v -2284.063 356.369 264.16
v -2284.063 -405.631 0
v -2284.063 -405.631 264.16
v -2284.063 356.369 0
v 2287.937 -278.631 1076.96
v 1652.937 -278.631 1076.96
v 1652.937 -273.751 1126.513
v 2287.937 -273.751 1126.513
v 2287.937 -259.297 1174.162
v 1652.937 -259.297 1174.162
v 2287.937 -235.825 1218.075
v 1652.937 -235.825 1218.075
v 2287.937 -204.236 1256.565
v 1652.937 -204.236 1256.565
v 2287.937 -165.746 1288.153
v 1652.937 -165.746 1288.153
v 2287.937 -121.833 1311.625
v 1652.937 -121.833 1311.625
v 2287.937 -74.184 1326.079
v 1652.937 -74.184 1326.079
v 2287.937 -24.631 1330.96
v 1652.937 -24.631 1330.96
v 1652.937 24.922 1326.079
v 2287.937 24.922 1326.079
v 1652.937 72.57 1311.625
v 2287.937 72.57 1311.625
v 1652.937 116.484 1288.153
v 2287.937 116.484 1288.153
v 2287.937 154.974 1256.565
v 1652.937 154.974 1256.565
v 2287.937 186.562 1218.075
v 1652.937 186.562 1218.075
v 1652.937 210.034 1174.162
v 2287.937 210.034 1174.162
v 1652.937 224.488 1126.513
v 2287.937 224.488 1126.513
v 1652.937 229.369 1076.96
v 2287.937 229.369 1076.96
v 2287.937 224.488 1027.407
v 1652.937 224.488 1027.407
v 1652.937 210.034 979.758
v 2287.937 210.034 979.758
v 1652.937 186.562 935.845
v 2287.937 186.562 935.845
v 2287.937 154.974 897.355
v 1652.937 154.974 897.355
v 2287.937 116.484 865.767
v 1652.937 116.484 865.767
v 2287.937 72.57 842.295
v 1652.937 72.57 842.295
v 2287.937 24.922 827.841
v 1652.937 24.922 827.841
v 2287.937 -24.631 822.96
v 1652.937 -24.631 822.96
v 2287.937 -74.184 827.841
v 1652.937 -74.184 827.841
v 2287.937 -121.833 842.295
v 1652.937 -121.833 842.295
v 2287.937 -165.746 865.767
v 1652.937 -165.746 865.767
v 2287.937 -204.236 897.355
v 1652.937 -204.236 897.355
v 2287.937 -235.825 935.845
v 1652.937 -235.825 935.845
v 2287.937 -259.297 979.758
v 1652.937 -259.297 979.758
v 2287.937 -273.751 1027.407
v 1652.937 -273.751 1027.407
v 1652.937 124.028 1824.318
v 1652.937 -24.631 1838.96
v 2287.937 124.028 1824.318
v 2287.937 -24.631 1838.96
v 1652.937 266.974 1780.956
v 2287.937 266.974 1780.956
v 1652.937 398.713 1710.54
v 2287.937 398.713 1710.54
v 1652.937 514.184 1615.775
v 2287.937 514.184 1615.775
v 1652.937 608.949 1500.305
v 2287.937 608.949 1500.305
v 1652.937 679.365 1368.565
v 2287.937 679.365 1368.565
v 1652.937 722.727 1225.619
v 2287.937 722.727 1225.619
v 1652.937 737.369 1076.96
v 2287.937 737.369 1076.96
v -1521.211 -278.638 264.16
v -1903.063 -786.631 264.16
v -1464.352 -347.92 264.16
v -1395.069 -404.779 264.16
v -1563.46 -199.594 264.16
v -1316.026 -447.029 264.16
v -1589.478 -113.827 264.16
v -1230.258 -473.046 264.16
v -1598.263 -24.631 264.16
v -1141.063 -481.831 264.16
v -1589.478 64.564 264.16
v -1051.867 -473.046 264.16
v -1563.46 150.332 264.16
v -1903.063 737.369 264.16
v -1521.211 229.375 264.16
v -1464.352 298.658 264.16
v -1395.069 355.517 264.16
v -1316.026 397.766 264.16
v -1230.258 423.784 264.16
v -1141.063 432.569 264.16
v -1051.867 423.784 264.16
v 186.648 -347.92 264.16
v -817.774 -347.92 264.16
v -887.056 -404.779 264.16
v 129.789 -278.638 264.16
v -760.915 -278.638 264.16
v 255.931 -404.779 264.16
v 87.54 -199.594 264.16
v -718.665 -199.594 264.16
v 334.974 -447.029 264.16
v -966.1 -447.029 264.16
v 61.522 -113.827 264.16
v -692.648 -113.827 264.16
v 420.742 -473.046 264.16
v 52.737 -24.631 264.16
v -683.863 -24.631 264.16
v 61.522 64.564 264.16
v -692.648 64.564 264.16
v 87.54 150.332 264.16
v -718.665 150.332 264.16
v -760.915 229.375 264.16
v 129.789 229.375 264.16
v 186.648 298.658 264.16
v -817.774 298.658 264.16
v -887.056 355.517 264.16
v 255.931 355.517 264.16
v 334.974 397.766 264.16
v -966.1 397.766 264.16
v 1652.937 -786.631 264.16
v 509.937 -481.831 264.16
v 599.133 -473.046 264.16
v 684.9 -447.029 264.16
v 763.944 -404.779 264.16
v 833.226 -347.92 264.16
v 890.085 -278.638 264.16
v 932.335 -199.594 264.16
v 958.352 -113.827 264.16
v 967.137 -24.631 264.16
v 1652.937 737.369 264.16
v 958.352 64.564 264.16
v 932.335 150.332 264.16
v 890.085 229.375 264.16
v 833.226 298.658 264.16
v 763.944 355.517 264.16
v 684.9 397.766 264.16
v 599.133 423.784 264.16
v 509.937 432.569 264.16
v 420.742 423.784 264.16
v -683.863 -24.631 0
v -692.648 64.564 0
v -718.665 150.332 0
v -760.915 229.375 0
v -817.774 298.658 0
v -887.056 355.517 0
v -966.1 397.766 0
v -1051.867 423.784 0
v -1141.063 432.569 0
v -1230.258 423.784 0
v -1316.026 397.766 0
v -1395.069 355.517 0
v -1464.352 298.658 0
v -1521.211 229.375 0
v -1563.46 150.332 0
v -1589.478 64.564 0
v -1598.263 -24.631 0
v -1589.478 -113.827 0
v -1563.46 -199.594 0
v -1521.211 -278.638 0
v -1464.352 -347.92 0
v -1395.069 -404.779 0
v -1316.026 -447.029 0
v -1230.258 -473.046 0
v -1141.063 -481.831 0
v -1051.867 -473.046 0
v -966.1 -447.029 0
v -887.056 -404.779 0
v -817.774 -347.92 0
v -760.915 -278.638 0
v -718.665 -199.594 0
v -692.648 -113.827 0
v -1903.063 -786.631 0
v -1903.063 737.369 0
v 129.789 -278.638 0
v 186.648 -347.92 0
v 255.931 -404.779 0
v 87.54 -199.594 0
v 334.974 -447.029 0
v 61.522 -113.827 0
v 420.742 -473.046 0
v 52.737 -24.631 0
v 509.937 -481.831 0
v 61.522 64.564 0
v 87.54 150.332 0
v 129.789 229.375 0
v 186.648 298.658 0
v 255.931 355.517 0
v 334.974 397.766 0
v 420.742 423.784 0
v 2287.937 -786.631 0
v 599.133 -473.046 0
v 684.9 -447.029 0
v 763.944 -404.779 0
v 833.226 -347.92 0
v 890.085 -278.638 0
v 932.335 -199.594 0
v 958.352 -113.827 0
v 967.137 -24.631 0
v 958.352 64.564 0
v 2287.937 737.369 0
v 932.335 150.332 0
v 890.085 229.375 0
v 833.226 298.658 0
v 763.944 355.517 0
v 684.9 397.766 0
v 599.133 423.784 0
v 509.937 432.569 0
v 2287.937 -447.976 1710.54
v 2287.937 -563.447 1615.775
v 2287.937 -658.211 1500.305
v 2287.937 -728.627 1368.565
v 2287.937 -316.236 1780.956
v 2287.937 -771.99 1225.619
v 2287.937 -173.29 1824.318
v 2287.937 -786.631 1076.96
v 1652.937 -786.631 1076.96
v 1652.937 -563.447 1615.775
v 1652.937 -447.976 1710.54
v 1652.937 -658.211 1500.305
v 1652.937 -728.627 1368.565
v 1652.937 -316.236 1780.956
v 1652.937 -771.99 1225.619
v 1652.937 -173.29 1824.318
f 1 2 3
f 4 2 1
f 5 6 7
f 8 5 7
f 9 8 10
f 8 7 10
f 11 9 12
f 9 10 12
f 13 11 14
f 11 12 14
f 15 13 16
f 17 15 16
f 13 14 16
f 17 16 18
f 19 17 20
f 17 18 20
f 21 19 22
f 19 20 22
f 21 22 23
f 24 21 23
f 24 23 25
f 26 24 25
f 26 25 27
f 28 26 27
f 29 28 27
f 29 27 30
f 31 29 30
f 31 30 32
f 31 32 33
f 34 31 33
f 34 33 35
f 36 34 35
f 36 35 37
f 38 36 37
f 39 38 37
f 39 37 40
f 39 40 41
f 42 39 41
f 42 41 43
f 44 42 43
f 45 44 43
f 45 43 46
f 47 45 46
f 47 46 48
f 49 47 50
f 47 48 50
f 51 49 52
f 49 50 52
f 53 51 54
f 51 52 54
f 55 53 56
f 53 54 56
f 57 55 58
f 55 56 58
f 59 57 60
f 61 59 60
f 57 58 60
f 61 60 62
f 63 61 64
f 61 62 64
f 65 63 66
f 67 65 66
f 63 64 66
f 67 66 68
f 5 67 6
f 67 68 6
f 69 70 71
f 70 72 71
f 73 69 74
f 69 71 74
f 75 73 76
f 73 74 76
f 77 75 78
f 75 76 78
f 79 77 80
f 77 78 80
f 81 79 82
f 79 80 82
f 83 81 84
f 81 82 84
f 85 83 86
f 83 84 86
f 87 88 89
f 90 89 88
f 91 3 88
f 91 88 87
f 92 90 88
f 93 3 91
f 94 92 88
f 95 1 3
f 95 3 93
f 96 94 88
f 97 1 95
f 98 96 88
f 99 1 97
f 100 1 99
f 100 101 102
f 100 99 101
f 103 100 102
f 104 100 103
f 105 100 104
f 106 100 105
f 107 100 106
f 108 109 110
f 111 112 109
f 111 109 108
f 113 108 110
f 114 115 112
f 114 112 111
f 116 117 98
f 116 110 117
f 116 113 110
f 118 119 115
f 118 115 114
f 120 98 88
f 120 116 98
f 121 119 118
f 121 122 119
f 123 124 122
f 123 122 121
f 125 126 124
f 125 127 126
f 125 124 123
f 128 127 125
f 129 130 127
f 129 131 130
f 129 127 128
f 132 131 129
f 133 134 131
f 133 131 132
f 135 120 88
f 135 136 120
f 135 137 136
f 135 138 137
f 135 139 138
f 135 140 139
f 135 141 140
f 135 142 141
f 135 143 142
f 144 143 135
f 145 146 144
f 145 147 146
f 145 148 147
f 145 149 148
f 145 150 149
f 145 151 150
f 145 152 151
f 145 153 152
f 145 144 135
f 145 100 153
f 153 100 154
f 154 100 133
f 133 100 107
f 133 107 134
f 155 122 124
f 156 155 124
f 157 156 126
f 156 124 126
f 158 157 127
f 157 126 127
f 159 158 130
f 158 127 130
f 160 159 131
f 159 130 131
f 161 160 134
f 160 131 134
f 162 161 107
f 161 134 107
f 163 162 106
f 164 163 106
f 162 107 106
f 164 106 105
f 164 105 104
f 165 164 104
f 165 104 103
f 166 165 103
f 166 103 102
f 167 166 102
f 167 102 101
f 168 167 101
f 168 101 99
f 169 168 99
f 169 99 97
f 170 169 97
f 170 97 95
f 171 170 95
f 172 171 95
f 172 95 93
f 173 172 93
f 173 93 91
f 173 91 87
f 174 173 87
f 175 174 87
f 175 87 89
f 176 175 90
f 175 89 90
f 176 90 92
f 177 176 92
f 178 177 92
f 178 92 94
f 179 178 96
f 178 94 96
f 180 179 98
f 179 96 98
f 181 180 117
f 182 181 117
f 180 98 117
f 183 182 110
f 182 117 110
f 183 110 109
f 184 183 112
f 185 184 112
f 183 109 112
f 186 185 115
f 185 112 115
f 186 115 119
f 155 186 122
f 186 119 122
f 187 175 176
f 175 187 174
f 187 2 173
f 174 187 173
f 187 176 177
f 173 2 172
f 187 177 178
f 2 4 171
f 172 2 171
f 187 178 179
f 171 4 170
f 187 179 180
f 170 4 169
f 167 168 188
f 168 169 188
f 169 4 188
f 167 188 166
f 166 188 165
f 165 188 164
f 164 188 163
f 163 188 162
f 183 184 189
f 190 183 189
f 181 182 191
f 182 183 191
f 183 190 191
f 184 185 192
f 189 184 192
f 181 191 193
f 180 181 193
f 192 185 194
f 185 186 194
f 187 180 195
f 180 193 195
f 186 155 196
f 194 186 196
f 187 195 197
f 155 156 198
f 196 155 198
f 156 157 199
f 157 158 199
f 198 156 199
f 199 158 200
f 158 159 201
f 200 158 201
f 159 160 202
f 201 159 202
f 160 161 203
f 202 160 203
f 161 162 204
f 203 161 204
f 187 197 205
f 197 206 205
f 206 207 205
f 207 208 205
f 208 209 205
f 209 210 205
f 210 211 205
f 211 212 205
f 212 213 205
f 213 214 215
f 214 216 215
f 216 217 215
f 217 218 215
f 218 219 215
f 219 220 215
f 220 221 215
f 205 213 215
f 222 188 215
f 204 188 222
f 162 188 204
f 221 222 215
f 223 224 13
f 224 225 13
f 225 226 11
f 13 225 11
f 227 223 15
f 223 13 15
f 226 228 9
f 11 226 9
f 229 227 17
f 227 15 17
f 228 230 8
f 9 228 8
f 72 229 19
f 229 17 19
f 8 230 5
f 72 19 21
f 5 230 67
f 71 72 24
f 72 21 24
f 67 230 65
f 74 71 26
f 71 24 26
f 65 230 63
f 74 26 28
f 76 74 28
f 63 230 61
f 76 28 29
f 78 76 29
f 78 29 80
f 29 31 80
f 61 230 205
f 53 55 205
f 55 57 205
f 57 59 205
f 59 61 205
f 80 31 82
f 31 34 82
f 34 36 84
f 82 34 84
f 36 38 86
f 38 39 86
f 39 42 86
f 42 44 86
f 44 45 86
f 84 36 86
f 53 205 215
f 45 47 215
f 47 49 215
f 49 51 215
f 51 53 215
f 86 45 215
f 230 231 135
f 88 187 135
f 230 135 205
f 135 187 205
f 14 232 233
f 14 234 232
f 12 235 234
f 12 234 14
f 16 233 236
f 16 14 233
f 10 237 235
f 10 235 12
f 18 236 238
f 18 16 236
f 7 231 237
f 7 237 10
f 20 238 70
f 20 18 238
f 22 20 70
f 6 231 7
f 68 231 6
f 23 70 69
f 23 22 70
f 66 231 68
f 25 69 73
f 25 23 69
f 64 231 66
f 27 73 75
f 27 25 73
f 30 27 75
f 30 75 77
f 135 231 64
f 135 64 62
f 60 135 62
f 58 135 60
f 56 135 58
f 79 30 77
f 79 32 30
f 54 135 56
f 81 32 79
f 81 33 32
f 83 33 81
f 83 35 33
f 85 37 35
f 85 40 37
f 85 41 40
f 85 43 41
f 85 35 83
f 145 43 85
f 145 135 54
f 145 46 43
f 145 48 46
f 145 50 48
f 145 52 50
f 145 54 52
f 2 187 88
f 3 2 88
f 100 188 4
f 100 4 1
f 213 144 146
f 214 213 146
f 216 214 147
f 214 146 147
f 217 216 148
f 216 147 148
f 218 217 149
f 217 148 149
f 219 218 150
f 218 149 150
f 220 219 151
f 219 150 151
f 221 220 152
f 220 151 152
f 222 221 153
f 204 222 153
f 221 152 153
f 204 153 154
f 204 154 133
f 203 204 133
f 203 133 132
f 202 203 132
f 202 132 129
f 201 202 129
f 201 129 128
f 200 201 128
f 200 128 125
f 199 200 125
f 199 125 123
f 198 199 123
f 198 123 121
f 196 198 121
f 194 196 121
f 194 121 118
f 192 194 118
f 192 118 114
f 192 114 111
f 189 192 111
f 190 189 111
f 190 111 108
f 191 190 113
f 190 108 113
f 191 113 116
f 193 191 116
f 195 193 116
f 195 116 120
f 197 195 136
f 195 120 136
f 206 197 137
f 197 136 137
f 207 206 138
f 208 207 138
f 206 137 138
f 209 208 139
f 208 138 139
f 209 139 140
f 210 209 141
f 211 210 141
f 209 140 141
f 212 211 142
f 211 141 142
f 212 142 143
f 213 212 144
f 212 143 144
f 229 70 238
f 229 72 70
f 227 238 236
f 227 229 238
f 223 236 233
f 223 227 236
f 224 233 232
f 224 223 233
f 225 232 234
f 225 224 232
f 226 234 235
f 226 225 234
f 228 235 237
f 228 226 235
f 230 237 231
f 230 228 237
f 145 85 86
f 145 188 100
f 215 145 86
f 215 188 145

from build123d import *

# Parameters (mm, degrees)
F0_W     = 4572
F0_H     = 1524
F1_DEPTH = 264.16
F2_W     = 635
F2_H     = 1524
F3_DEPTH = 1574.8
F4_R     = 761.99999
F5_R     = 457.2
F6_DEPTH = 1475.74
F7_R     = 254
F8_DEPTH = 863.6
F9_SIZE  = 381
F10_SIZE = 381


# Not quite as in the source:
# - a fillet or chamfer is up to 0.001 mm smaller than in the source, because OpenCascade refuses the exact size


with BuildPart() as f1:
    # F0 (on Top) → F1 (new body)
    with BuildSketch(Plane.XY):
        with Locations((1.9372347742, -24.6312463946)):
            Rectangle(F0_W, F0_H)
    extrude(amount=F1_DEPTH)

    # F2 (on face) → F3 (join)
    with BuildSketch(Plane.XY.offset(264.16)):
        with Locations((1970.4372347742, -24.6312463946)):
            Rectangle(F2_W, F2_H)
    extrude(amount=F3_DEPTH)

    # F4 (radius 762 in the source; OpenCascade refuses exactly that, so slightly less here)
    f4_edges = [f1.edges().sort_by_distance(p)[0] for p in [
        (1970.437235, 737.368754, 1838.96),
        (1970.437235, -786.631246, 1838.96),
    ]]
    fillet(f4_edges, radius=F4_R)

    # F5 (on face) → F6 (cut)
    with BuildSketch(Plane.XY.offset(264.16)):
        with Locations((509.9372347742, -24.6312463946)):
            Circle(F5_R)
        with Locations((-1141.0627652258, -24.6312463946)):
            Circle(F5_R)
    extrude(amount=-F6_DEPTH, mode=Mode.SUBTRACT)

    # F7 (on face) → F8 (cut)
    with BuildSketch(Plane(origin=(1652.9372347742, 0, 0), x_dir=(0, -1, 0), z_dir=(-1, 0, 0))):
        with Locations((24.6312463946, 1076.96)):
            Circle(F7_R)
    extrude(amount=-F8_DEPTH, mode=Mode.SUBTRACT)

    # F9
    f9_edges = [f1.edges().sort_by_distance(p)[0] for p in [
        (-2284.062765, 737.368754, 132.08),
    ]]
    chamfer(f9_edges, length=F9_SIZE)

    # F10
    f10_edges = [f1.edges().sort_by_distance(p)[0] for p in [
        (-2284.062765, -786.631246, 132.08),
    ]]
    chamfer(f10_edges, length=F10_SIZE)


solid = f1.part
